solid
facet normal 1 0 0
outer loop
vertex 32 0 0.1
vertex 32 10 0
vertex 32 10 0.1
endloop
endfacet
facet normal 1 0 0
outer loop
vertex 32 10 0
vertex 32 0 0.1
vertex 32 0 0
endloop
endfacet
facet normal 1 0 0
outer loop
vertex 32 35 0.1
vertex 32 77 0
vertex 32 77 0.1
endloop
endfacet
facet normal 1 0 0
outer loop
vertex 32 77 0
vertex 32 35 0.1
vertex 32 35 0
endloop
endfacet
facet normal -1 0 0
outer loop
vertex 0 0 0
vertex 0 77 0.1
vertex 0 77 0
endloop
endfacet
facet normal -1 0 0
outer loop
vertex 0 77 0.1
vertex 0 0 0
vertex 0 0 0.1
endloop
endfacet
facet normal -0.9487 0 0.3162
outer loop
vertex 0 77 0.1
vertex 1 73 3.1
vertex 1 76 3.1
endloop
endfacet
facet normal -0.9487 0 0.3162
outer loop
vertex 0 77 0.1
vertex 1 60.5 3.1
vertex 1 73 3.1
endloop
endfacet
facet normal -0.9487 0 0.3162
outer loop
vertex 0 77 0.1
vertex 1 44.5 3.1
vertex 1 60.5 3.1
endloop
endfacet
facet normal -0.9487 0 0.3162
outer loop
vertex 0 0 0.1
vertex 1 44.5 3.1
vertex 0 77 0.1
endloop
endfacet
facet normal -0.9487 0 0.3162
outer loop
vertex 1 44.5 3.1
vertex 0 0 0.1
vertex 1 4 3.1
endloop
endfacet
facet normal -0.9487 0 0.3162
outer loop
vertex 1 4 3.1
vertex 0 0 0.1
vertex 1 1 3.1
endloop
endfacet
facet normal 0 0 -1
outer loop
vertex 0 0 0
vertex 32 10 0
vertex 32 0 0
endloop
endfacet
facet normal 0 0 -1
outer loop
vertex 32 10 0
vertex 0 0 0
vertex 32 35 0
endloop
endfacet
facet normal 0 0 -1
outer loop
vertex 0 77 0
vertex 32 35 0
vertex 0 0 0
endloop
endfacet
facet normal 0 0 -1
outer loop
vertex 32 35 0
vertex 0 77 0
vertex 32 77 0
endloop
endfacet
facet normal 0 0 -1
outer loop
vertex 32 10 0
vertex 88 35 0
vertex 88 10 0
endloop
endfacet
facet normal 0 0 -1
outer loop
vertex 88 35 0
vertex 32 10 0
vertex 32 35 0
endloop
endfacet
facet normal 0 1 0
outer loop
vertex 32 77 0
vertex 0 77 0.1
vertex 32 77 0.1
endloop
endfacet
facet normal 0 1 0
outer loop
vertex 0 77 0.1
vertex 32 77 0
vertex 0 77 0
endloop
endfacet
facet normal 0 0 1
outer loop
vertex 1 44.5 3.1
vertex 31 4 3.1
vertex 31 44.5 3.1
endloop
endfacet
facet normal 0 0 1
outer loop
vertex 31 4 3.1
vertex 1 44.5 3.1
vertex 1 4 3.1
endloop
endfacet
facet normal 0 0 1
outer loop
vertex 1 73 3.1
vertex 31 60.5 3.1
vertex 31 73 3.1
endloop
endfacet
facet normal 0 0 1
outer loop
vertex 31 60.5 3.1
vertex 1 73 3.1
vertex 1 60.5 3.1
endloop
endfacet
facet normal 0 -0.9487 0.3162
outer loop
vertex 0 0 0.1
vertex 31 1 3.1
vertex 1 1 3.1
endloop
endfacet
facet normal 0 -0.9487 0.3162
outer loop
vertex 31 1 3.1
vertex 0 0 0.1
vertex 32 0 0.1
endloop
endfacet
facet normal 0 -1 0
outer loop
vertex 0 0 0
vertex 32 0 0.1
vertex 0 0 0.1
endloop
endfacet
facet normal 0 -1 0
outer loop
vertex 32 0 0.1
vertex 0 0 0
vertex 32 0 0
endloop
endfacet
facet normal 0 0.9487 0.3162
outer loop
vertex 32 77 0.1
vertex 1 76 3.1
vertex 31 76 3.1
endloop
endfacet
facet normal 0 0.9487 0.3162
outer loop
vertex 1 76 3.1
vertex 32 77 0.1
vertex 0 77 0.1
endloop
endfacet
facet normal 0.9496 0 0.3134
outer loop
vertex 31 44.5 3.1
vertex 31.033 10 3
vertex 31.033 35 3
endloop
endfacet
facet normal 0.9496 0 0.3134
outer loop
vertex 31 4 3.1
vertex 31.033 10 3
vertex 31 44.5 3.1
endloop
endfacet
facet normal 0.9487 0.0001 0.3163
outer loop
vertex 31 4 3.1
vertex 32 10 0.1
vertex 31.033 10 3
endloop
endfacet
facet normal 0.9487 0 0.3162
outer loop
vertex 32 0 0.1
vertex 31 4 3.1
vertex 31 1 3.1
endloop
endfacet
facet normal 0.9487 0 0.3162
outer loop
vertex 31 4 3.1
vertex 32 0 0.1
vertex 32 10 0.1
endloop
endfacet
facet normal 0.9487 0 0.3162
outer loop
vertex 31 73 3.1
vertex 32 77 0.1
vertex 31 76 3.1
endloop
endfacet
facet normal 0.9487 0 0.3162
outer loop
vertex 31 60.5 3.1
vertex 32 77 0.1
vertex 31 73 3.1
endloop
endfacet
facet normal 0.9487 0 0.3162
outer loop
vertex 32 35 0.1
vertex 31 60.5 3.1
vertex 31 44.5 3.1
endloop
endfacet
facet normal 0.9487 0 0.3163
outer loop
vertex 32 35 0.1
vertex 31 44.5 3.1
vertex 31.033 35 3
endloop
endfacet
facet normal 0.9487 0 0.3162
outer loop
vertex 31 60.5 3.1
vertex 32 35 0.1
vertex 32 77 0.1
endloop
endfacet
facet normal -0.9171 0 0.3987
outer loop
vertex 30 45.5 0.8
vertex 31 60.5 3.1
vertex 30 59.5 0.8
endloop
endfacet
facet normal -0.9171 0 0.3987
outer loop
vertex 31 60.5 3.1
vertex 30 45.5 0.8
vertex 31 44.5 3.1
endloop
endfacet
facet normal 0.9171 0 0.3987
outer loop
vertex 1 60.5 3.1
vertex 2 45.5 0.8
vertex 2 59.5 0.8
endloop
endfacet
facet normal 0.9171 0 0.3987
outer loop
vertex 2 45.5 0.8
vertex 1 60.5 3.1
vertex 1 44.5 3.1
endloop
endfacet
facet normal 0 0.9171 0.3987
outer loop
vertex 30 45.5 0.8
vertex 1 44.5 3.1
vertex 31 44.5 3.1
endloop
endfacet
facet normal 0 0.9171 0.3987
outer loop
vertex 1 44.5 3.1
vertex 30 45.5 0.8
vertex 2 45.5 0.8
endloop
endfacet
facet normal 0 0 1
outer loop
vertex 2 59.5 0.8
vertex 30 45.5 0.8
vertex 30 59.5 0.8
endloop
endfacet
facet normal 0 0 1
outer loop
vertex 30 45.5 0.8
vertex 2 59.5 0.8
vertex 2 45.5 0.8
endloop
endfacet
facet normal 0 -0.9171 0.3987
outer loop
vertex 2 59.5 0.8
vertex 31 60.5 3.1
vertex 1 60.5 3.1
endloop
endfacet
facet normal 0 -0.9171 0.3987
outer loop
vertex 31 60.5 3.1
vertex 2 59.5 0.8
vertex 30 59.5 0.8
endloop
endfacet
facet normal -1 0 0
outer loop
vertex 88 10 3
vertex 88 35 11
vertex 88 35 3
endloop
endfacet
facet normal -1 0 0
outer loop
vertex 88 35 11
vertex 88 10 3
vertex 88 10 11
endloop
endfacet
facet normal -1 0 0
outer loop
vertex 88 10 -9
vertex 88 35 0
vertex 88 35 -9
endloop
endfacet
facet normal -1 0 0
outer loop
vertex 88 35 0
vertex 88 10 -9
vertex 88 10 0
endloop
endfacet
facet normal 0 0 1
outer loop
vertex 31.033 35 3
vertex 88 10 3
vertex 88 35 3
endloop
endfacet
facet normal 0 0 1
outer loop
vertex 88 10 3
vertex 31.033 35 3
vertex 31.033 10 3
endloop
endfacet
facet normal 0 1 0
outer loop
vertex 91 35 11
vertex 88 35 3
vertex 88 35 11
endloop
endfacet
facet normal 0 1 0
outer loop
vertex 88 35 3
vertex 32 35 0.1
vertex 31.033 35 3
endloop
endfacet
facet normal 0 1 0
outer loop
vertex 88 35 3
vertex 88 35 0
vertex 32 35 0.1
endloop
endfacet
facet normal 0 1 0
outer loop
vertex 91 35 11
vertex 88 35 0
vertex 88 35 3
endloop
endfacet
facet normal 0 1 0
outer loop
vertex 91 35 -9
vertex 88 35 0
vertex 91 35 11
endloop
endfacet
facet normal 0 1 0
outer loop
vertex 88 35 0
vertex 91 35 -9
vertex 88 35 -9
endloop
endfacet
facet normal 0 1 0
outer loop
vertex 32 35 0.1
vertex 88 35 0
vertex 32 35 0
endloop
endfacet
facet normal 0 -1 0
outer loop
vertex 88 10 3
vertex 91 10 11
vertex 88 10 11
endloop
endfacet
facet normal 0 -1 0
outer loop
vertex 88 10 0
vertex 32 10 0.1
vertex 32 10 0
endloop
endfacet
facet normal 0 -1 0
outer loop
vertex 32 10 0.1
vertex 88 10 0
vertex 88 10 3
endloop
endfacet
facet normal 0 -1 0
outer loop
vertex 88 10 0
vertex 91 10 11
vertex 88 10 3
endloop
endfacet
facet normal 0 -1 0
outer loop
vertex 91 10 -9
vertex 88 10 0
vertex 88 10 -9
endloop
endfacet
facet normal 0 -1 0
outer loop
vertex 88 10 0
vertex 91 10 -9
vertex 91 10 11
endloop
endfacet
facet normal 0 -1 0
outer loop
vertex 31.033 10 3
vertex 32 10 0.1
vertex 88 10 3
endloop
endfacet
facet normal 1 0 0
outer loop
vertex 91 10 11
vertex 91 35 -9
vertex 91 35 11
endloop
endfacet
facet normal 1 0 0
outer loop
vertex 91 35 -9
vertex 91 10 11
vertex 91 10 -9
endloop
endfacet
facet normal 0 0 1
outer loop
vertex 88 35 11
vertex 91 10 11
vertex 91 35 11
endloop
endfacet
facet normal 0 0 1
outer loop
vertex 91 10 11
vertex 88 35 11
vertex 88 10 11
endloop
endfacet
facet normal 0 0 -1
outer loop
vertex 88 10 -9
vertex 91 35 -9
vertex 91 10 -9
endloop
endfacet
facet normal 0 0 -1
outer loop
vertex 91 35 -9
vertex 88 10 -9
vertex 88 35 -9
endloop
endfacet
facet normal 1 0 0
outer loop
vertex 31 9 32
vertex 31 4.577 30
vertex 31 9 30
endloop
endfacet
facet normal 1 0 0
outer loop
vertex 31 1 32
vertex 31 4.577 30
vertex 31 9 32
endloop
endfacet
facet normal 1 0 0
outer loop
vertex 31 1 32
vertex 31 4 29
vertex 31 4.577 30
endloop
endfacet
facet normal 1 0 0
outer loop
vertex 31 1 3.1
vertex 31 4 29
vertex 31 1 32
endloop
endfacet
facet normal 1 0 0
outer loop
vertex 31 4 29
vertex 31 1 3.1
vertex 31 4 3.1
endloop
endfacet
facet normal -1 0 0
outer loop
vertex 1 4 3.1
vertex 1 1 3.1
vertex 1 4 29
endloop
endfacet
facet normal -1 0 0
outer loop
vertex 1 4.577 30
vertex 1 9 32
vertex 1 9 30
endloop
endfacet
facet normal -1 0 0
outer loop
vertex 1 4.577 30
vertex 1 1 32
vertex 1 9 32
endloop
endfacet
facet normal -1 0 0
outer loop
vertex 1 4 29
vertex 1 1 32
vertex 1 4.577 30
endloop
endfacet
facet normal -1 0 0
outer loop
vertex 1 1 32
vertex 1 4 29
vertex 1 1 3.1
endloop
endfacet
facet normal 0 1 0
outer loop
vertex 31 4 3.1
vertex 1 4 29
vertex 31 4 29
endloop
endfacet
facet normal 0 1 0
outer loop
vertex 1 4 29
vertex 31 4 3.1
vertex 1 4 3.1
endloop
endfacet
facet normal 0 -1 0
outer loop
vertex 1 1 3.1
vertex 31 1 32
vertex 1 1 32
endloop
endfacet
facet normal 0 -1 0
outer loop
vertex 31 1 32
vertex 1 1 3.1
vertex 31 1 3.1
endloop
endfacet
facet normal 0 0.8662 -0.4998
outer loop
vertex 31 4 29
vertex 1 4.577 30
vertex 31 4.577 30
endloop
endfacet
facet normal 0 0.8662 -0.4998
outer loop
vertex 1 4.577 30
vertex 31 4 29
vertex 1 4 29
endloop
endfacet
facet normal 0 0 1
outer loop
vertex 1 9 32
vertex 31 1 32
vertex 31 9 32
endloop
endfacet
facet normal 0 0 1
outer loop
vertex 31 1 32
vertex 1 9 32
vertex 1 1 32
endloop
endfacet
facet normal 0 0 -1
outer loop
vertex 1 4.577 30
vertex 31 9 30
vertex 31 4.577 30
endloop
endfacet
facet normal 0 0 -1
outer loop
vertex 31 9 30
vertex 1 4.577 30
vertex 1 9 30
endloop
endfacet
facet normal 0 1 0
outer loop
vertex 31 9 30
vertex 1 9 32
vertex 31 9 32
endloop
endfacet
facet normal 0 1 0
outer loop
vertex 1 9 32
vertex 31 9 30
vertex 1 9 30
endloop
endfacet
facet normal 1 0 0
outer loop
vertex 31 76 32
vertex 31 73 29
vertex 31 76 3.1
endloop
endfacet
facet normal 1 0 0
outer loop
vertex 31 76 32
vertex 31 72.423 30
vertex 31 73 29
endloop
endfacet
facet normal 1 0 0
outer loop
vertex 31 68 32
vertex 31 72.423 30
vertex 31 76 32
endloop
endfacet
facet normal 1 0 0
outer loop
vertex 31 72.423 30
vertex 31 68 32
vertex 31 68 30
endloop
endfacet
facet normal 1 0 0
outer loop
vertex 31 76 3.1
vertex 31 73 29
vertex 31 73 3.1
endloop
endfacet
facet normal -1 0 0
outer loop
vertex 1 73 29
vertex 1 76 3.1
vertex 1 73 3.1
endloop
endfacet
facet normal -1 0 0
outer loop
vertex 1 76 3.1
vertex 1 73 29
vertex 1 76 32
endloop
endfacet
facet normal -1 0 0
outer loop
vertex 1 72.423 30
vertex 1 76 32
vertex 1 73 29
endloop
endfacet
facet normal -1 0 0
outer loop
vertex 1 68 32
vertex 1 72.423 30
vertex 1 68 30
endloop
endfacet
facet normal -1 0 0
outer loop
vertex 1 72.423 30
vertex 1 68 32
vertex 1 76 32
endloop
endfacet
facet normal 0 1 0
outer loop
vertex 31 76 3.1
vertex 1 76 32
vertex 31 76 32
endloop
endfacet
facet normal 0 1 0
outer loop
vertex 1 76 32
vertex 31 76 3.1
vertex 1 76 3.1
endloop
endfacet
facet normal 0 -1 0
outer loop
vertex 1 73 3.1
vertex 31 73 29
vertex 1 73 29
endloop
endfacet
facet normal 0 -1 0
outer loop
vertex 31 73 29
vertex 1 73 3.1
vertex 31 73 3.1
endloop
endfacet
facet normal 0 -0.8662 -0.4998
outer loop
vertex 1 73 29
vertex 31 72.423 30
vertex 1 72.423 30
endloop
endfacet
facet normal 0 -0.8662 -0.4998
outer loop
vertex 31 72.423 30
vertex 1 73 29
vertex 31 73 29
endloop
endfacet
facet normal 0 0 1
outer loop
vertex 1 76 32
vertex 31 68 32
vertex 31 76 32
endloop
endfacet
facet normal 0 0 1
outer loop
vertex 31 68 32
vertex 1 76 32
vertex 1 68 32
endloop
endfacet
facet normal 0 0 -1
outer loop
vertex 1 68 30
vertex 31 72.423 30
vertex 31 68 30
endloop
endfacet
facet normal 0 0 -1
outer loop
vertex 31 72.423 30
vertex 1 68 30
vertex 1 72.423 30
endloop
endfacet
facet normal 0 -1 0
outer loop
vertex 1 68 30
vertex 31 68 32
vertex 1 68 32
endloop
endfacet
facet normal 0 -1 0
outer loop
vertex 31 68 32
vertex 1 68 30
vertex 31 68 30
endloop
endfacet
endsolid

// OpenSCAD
// Base Config
base_W = 23.5;
base_H = 24;
base_T = 0.5;
default_T = 2.0;
default_S = 12;
// $fn = 60; // When this line comment out, my pc was stoped.
// Ring Config
ring_H = 10;
ring_base_R = 24;
ring_base_W = 6;
minkowski_R = 2;

difference() {
    hull(){
        translate([0, 0, 0]) cube([32, 77, 0.1]);
        translate([1, 1, 3]) cube([30, 75, 0.1]);
    }
    #hull(){
        translate([2, 45.5, 0.8]) cube([28, 14, 0.1]);
        translate([1, 44.5, 3.1]) cube([30, 16, 0.1]);
    }
}

translate([1, 1, 0]) cube([30, 3, 30.5]);
translate([1, 4, 30]) rotate([0, 90, 0]) cylinder(h=30, r=1, center=false, $fn=3);
translate([1, 1, 30]) cube([30, 8, 2]);

translate([1, 73, 0]) cube([30, 3, 30.5]);
translate([1, 73, 30]) rotate([0, 90, 0]) cylinder(h=30, r=1, center=false, $fn=3);
translate([1, 68, 30]) cube([30, 8, 2]);

translate([0, 10, 0]) union(){
    translate([28, 0, 0]) cube([60, 25, 3]);
    translate([88, 0, -9]) cube([3, 25, 20]);
}
// base block
//staple_base(base_T,base_W,base_H,default_S,default_T);
// hull(){
//     translate([1, 16, default_T]) cube([base_W - 2, 26, default_T]);
//     translate([1, 17, default_T * 2]) cube([base_W - 2, 20, default_T]);
// }
// Ring block
// translate([11.75, 32, 35]) {
//     rotate([90, 180, 0]) {
//         // Ring part
//         translate([0, 0, minkowski_R]) {
//             minkowski() {
//                 difference() {
//                     cylinder(h = ring_H, r = ring_base_R + ring_base_W);
//                     union() {
//                         cylinder(h = ring_H, r1 = ring_base_R, r2 = ring_base_R + (ring_base_W / 2));
//                         translate([-12.5, -33, 0]) cube(25);
//                     }
//                 }
//                 sphere(minkowski_R);
//             }
//         }
//     }
// }

module stapler_area(bt,bw,ds,dt) {
    hull() {
        translate([0, 0, dt - bt]) cube([bw - dt, ds + 2, 0.1]);
        translate([1, 1, 0]) cube([bw - dt * 2, ds, 0.1]);
    }
}

module staple_base(bt,bw,bh,ds,dt) {
    union() {
        // Base1(Bottom)
        cube([bw, bh, bt]);
        // Base2(Top)
        translate([0, 0, bt]) {
            difference() {
                // Base2_body
                hull() {
                    translate([1, 1, dt - bt]) cube([bw - 2, bh - 2, 0.1]);
                    translate([0, 0, 0]) cube([bw, bh, 0.1]);
                }
                // Base2_stapler_area1(Top)
                # translate([dt - 1, dt - 1, 0]) stapler_area(bt,bw,ds,dt);
                // Base2_stapler_area2(Bottom)
                # translate([dt - 1, bh - ds - dt - 1, 0]) stapler_area(bt,bw,ds,dt);
            }
        }
    }
}
